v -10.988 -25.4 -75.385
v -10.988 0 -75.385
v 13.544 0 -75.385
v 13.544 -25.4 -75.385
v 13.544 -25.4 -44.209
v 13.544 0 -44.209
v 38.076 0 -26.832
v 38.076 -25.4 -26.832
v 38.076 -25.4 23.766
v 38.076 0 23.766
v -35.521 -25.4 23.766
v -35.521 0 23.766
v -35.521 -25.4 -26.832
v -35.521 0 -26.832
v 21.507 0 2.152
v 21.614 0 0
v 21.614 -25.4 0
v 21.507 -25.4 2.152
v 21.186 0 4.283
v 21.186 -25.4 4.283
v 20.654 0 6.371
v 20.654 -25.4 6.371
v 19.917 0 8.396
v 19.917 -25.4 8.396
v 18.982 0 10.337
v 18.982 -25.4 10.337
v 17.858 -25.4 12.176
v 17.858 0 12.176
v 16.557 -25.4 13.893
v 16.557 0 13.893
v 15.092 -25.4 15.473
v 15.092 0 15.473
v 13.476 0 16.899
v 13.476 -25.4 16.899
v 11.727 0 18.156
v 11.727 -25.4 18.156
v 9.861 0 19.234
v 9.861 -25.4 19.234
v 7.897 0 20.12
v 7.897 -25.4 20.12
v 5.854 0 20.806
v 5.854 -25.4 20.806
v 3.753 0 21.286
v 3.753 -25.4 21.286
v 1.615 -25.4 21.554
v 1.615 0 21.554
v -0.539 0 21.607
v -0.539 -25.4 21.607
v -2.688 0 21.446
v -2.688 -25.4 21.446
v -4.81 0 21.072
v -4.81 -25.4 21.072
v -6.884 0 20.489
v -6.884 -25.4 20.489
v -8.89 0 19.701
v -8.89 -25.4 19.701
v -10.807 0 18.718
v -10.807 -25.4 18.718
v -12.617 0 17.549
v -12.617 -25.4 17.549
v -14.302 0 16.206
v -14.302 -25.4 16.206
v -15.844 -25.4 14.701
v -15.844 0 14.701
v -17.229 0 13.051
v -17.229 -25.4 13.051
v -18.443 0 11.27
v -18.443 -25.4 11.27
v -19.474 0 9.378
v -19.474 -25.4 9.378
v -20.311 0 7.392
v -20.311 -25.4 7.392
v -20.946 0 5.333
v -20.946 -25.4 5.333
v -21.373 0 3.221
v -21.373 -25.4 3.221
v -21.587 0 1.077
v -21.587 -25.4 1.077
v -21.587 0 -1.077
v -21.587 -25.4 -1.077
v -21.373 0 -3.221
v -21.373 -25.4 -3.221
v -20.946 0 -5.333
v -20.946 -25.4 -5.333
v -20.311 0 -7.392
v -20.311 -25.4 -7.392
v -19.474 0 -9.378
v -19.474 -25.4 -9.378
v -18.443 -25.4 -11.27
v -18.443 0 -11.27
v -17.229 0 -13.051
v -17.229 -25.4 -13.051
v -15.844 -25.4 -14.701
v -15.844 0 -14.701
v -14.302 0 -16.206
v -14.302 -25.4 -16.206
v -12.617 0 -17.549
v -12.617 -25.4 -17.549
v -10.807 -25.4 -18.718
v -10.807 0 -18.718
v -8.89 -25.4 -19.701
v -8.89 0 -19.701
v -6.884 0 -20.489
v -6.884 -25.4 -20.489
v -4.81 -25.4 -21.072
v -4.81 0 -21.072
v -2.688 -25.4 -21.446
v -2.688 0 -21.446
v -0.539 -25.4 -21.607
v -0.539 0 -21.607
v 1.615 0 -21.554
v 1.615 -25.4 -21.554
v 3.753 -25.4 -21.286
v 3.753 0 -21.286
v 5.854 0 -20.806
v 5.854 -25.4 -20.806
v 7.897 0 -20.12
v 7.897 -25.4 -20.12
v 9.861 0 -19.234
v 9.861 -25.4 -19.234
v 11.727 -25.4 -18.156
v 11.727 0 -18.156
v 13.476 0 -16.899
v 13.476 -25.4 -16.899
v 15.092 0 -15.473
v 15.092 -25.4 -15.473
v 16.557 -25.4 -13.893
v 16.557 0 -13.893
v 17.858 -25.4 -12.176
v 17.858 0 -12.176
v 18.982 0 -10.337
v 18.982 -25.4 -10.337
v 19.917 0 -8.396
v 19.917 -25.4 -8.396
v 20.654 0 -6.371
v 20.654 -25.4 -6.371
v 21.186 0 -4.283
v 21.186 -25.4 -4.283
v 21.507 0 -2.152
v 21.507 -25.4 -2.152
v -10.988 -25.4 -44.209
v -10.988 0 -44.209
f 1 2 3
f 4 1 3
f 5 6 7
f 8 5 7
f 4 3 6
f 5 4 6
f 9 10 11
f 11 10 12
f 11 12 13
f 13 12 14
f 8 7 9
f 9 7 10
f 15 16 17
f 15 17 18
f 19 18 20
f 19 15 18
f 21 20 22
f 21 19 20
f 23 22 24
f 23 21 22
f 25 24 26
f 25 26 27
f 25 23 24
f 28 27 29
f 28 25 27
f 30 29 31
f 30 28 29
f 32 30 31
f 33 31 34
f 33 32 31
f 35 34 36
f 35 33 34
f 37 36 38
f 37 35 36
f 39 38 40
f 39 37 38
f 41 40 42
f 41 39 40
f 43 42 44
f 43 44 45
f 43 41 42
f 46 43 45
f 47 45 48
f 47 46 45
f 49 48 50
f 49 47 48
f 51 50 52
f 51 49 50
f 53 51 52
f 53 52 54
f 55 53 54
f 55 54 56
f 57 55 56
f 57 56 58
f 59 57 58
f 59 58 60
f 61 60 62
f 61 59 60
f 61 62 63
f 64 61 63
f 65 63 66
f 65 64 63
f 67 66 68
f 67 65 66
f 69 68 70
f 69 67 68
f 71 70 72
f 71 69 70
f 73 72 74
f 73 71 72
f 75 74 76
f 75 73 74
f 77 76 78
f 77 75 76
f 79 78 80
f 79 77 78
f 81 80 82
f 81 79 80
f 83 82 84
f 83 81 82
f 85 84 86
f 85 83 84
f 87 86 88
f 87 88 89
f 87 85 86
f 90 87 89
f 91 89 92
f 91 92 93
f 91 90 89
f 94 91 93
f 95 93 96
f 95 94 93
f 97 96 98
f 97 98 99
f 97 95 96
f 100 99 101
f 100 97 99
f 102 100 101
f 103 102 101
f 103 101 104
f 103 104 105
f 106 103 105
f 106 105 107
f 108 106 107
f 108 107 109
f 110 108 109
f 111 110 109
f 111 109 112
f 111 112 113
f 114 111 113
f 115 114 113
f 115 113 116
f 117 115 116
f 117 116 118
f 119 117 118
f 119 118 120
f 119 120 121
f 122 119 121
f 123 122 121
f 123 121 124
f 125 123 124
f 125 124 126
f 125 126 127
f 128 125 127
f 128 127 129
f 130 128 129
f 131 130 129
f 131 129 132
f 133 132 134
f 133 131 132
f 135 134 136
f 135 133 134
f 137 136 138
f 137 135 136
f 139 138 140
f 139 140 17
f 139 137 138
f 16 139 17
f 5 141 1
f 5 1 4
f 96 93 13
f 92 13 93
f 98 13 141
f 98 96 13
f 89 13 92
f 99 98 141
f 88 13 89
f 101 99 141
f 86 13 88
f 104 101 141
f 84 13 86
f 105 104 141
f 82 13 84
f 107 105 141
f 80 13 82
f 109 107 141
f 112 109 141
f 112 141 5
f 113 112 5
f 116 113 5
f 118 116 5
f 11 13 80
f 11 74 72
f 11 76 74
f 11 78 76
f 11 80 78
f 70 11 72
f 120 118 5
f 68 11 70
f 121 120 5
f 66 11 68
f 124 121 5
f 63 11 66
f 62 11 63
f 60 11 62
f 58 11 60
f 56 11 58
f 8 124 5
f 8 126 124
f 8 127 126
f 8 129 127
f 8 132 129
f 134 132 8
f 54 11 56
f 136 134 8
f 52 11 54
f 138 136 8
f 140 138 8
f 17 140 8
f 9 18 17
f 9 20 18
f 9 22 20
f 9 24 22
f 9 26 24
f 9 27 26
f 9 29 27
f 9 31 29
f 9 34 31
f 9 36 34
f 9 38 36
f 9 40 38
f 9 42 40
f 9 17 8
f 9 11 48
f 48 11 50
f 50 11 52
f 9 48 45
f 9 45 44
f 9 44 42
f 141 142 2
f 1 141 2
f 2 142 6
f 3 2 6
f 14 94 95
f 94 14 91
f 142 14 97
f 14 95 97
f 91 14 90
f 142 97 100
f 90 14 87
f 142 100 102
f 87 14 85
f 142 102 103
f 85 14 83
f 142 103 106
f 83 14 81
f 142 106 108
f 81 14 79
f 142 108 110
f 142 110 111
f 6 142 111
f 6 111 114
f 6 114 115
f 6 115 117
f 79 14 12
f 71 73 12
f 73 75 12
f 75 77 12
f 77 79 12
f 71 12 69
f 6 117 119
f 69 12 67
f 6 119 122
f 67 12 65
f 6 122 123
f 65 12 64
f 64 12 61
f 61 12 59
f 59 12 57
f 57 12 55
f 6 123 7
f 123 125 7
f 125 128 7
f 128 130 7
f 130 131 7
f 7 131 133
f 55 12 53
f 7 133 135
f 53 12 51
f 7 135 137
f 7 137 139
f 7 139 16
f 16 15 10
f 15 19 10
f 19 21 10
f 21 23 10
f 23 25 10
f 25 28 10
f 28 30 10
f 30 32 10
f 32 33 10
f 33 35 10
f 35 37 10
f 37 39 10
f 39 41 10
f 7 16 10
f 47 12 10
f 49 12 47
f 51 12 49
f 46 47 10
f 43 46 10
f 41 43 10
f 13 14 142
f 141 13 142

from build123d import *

# Parameters (mm, degrees)
F0_R     = 21.614199
F1_DEPTH = 25.4


with BuildPart() as f1:
    # F0 (on Front) → F1 (new body)
    with BuildSketch(Plane.XZ):
        Polygon((-35.520531, 23.765538), (-35.520531, 0), (-35.520531, -26.832053), (-10.988366, -44.209), (-10.988366, -75.385295), (13.543796, -75.385295), (13.543796, -44.209), (38.075965, -26.832053), (38.075965, 0), (38.075965, 23.765538), align=None)
        Circle(F0_R, mode=Mode.SUBTRACT)
    extrude(amount=F1_DEPTH)


solid = f1.part
